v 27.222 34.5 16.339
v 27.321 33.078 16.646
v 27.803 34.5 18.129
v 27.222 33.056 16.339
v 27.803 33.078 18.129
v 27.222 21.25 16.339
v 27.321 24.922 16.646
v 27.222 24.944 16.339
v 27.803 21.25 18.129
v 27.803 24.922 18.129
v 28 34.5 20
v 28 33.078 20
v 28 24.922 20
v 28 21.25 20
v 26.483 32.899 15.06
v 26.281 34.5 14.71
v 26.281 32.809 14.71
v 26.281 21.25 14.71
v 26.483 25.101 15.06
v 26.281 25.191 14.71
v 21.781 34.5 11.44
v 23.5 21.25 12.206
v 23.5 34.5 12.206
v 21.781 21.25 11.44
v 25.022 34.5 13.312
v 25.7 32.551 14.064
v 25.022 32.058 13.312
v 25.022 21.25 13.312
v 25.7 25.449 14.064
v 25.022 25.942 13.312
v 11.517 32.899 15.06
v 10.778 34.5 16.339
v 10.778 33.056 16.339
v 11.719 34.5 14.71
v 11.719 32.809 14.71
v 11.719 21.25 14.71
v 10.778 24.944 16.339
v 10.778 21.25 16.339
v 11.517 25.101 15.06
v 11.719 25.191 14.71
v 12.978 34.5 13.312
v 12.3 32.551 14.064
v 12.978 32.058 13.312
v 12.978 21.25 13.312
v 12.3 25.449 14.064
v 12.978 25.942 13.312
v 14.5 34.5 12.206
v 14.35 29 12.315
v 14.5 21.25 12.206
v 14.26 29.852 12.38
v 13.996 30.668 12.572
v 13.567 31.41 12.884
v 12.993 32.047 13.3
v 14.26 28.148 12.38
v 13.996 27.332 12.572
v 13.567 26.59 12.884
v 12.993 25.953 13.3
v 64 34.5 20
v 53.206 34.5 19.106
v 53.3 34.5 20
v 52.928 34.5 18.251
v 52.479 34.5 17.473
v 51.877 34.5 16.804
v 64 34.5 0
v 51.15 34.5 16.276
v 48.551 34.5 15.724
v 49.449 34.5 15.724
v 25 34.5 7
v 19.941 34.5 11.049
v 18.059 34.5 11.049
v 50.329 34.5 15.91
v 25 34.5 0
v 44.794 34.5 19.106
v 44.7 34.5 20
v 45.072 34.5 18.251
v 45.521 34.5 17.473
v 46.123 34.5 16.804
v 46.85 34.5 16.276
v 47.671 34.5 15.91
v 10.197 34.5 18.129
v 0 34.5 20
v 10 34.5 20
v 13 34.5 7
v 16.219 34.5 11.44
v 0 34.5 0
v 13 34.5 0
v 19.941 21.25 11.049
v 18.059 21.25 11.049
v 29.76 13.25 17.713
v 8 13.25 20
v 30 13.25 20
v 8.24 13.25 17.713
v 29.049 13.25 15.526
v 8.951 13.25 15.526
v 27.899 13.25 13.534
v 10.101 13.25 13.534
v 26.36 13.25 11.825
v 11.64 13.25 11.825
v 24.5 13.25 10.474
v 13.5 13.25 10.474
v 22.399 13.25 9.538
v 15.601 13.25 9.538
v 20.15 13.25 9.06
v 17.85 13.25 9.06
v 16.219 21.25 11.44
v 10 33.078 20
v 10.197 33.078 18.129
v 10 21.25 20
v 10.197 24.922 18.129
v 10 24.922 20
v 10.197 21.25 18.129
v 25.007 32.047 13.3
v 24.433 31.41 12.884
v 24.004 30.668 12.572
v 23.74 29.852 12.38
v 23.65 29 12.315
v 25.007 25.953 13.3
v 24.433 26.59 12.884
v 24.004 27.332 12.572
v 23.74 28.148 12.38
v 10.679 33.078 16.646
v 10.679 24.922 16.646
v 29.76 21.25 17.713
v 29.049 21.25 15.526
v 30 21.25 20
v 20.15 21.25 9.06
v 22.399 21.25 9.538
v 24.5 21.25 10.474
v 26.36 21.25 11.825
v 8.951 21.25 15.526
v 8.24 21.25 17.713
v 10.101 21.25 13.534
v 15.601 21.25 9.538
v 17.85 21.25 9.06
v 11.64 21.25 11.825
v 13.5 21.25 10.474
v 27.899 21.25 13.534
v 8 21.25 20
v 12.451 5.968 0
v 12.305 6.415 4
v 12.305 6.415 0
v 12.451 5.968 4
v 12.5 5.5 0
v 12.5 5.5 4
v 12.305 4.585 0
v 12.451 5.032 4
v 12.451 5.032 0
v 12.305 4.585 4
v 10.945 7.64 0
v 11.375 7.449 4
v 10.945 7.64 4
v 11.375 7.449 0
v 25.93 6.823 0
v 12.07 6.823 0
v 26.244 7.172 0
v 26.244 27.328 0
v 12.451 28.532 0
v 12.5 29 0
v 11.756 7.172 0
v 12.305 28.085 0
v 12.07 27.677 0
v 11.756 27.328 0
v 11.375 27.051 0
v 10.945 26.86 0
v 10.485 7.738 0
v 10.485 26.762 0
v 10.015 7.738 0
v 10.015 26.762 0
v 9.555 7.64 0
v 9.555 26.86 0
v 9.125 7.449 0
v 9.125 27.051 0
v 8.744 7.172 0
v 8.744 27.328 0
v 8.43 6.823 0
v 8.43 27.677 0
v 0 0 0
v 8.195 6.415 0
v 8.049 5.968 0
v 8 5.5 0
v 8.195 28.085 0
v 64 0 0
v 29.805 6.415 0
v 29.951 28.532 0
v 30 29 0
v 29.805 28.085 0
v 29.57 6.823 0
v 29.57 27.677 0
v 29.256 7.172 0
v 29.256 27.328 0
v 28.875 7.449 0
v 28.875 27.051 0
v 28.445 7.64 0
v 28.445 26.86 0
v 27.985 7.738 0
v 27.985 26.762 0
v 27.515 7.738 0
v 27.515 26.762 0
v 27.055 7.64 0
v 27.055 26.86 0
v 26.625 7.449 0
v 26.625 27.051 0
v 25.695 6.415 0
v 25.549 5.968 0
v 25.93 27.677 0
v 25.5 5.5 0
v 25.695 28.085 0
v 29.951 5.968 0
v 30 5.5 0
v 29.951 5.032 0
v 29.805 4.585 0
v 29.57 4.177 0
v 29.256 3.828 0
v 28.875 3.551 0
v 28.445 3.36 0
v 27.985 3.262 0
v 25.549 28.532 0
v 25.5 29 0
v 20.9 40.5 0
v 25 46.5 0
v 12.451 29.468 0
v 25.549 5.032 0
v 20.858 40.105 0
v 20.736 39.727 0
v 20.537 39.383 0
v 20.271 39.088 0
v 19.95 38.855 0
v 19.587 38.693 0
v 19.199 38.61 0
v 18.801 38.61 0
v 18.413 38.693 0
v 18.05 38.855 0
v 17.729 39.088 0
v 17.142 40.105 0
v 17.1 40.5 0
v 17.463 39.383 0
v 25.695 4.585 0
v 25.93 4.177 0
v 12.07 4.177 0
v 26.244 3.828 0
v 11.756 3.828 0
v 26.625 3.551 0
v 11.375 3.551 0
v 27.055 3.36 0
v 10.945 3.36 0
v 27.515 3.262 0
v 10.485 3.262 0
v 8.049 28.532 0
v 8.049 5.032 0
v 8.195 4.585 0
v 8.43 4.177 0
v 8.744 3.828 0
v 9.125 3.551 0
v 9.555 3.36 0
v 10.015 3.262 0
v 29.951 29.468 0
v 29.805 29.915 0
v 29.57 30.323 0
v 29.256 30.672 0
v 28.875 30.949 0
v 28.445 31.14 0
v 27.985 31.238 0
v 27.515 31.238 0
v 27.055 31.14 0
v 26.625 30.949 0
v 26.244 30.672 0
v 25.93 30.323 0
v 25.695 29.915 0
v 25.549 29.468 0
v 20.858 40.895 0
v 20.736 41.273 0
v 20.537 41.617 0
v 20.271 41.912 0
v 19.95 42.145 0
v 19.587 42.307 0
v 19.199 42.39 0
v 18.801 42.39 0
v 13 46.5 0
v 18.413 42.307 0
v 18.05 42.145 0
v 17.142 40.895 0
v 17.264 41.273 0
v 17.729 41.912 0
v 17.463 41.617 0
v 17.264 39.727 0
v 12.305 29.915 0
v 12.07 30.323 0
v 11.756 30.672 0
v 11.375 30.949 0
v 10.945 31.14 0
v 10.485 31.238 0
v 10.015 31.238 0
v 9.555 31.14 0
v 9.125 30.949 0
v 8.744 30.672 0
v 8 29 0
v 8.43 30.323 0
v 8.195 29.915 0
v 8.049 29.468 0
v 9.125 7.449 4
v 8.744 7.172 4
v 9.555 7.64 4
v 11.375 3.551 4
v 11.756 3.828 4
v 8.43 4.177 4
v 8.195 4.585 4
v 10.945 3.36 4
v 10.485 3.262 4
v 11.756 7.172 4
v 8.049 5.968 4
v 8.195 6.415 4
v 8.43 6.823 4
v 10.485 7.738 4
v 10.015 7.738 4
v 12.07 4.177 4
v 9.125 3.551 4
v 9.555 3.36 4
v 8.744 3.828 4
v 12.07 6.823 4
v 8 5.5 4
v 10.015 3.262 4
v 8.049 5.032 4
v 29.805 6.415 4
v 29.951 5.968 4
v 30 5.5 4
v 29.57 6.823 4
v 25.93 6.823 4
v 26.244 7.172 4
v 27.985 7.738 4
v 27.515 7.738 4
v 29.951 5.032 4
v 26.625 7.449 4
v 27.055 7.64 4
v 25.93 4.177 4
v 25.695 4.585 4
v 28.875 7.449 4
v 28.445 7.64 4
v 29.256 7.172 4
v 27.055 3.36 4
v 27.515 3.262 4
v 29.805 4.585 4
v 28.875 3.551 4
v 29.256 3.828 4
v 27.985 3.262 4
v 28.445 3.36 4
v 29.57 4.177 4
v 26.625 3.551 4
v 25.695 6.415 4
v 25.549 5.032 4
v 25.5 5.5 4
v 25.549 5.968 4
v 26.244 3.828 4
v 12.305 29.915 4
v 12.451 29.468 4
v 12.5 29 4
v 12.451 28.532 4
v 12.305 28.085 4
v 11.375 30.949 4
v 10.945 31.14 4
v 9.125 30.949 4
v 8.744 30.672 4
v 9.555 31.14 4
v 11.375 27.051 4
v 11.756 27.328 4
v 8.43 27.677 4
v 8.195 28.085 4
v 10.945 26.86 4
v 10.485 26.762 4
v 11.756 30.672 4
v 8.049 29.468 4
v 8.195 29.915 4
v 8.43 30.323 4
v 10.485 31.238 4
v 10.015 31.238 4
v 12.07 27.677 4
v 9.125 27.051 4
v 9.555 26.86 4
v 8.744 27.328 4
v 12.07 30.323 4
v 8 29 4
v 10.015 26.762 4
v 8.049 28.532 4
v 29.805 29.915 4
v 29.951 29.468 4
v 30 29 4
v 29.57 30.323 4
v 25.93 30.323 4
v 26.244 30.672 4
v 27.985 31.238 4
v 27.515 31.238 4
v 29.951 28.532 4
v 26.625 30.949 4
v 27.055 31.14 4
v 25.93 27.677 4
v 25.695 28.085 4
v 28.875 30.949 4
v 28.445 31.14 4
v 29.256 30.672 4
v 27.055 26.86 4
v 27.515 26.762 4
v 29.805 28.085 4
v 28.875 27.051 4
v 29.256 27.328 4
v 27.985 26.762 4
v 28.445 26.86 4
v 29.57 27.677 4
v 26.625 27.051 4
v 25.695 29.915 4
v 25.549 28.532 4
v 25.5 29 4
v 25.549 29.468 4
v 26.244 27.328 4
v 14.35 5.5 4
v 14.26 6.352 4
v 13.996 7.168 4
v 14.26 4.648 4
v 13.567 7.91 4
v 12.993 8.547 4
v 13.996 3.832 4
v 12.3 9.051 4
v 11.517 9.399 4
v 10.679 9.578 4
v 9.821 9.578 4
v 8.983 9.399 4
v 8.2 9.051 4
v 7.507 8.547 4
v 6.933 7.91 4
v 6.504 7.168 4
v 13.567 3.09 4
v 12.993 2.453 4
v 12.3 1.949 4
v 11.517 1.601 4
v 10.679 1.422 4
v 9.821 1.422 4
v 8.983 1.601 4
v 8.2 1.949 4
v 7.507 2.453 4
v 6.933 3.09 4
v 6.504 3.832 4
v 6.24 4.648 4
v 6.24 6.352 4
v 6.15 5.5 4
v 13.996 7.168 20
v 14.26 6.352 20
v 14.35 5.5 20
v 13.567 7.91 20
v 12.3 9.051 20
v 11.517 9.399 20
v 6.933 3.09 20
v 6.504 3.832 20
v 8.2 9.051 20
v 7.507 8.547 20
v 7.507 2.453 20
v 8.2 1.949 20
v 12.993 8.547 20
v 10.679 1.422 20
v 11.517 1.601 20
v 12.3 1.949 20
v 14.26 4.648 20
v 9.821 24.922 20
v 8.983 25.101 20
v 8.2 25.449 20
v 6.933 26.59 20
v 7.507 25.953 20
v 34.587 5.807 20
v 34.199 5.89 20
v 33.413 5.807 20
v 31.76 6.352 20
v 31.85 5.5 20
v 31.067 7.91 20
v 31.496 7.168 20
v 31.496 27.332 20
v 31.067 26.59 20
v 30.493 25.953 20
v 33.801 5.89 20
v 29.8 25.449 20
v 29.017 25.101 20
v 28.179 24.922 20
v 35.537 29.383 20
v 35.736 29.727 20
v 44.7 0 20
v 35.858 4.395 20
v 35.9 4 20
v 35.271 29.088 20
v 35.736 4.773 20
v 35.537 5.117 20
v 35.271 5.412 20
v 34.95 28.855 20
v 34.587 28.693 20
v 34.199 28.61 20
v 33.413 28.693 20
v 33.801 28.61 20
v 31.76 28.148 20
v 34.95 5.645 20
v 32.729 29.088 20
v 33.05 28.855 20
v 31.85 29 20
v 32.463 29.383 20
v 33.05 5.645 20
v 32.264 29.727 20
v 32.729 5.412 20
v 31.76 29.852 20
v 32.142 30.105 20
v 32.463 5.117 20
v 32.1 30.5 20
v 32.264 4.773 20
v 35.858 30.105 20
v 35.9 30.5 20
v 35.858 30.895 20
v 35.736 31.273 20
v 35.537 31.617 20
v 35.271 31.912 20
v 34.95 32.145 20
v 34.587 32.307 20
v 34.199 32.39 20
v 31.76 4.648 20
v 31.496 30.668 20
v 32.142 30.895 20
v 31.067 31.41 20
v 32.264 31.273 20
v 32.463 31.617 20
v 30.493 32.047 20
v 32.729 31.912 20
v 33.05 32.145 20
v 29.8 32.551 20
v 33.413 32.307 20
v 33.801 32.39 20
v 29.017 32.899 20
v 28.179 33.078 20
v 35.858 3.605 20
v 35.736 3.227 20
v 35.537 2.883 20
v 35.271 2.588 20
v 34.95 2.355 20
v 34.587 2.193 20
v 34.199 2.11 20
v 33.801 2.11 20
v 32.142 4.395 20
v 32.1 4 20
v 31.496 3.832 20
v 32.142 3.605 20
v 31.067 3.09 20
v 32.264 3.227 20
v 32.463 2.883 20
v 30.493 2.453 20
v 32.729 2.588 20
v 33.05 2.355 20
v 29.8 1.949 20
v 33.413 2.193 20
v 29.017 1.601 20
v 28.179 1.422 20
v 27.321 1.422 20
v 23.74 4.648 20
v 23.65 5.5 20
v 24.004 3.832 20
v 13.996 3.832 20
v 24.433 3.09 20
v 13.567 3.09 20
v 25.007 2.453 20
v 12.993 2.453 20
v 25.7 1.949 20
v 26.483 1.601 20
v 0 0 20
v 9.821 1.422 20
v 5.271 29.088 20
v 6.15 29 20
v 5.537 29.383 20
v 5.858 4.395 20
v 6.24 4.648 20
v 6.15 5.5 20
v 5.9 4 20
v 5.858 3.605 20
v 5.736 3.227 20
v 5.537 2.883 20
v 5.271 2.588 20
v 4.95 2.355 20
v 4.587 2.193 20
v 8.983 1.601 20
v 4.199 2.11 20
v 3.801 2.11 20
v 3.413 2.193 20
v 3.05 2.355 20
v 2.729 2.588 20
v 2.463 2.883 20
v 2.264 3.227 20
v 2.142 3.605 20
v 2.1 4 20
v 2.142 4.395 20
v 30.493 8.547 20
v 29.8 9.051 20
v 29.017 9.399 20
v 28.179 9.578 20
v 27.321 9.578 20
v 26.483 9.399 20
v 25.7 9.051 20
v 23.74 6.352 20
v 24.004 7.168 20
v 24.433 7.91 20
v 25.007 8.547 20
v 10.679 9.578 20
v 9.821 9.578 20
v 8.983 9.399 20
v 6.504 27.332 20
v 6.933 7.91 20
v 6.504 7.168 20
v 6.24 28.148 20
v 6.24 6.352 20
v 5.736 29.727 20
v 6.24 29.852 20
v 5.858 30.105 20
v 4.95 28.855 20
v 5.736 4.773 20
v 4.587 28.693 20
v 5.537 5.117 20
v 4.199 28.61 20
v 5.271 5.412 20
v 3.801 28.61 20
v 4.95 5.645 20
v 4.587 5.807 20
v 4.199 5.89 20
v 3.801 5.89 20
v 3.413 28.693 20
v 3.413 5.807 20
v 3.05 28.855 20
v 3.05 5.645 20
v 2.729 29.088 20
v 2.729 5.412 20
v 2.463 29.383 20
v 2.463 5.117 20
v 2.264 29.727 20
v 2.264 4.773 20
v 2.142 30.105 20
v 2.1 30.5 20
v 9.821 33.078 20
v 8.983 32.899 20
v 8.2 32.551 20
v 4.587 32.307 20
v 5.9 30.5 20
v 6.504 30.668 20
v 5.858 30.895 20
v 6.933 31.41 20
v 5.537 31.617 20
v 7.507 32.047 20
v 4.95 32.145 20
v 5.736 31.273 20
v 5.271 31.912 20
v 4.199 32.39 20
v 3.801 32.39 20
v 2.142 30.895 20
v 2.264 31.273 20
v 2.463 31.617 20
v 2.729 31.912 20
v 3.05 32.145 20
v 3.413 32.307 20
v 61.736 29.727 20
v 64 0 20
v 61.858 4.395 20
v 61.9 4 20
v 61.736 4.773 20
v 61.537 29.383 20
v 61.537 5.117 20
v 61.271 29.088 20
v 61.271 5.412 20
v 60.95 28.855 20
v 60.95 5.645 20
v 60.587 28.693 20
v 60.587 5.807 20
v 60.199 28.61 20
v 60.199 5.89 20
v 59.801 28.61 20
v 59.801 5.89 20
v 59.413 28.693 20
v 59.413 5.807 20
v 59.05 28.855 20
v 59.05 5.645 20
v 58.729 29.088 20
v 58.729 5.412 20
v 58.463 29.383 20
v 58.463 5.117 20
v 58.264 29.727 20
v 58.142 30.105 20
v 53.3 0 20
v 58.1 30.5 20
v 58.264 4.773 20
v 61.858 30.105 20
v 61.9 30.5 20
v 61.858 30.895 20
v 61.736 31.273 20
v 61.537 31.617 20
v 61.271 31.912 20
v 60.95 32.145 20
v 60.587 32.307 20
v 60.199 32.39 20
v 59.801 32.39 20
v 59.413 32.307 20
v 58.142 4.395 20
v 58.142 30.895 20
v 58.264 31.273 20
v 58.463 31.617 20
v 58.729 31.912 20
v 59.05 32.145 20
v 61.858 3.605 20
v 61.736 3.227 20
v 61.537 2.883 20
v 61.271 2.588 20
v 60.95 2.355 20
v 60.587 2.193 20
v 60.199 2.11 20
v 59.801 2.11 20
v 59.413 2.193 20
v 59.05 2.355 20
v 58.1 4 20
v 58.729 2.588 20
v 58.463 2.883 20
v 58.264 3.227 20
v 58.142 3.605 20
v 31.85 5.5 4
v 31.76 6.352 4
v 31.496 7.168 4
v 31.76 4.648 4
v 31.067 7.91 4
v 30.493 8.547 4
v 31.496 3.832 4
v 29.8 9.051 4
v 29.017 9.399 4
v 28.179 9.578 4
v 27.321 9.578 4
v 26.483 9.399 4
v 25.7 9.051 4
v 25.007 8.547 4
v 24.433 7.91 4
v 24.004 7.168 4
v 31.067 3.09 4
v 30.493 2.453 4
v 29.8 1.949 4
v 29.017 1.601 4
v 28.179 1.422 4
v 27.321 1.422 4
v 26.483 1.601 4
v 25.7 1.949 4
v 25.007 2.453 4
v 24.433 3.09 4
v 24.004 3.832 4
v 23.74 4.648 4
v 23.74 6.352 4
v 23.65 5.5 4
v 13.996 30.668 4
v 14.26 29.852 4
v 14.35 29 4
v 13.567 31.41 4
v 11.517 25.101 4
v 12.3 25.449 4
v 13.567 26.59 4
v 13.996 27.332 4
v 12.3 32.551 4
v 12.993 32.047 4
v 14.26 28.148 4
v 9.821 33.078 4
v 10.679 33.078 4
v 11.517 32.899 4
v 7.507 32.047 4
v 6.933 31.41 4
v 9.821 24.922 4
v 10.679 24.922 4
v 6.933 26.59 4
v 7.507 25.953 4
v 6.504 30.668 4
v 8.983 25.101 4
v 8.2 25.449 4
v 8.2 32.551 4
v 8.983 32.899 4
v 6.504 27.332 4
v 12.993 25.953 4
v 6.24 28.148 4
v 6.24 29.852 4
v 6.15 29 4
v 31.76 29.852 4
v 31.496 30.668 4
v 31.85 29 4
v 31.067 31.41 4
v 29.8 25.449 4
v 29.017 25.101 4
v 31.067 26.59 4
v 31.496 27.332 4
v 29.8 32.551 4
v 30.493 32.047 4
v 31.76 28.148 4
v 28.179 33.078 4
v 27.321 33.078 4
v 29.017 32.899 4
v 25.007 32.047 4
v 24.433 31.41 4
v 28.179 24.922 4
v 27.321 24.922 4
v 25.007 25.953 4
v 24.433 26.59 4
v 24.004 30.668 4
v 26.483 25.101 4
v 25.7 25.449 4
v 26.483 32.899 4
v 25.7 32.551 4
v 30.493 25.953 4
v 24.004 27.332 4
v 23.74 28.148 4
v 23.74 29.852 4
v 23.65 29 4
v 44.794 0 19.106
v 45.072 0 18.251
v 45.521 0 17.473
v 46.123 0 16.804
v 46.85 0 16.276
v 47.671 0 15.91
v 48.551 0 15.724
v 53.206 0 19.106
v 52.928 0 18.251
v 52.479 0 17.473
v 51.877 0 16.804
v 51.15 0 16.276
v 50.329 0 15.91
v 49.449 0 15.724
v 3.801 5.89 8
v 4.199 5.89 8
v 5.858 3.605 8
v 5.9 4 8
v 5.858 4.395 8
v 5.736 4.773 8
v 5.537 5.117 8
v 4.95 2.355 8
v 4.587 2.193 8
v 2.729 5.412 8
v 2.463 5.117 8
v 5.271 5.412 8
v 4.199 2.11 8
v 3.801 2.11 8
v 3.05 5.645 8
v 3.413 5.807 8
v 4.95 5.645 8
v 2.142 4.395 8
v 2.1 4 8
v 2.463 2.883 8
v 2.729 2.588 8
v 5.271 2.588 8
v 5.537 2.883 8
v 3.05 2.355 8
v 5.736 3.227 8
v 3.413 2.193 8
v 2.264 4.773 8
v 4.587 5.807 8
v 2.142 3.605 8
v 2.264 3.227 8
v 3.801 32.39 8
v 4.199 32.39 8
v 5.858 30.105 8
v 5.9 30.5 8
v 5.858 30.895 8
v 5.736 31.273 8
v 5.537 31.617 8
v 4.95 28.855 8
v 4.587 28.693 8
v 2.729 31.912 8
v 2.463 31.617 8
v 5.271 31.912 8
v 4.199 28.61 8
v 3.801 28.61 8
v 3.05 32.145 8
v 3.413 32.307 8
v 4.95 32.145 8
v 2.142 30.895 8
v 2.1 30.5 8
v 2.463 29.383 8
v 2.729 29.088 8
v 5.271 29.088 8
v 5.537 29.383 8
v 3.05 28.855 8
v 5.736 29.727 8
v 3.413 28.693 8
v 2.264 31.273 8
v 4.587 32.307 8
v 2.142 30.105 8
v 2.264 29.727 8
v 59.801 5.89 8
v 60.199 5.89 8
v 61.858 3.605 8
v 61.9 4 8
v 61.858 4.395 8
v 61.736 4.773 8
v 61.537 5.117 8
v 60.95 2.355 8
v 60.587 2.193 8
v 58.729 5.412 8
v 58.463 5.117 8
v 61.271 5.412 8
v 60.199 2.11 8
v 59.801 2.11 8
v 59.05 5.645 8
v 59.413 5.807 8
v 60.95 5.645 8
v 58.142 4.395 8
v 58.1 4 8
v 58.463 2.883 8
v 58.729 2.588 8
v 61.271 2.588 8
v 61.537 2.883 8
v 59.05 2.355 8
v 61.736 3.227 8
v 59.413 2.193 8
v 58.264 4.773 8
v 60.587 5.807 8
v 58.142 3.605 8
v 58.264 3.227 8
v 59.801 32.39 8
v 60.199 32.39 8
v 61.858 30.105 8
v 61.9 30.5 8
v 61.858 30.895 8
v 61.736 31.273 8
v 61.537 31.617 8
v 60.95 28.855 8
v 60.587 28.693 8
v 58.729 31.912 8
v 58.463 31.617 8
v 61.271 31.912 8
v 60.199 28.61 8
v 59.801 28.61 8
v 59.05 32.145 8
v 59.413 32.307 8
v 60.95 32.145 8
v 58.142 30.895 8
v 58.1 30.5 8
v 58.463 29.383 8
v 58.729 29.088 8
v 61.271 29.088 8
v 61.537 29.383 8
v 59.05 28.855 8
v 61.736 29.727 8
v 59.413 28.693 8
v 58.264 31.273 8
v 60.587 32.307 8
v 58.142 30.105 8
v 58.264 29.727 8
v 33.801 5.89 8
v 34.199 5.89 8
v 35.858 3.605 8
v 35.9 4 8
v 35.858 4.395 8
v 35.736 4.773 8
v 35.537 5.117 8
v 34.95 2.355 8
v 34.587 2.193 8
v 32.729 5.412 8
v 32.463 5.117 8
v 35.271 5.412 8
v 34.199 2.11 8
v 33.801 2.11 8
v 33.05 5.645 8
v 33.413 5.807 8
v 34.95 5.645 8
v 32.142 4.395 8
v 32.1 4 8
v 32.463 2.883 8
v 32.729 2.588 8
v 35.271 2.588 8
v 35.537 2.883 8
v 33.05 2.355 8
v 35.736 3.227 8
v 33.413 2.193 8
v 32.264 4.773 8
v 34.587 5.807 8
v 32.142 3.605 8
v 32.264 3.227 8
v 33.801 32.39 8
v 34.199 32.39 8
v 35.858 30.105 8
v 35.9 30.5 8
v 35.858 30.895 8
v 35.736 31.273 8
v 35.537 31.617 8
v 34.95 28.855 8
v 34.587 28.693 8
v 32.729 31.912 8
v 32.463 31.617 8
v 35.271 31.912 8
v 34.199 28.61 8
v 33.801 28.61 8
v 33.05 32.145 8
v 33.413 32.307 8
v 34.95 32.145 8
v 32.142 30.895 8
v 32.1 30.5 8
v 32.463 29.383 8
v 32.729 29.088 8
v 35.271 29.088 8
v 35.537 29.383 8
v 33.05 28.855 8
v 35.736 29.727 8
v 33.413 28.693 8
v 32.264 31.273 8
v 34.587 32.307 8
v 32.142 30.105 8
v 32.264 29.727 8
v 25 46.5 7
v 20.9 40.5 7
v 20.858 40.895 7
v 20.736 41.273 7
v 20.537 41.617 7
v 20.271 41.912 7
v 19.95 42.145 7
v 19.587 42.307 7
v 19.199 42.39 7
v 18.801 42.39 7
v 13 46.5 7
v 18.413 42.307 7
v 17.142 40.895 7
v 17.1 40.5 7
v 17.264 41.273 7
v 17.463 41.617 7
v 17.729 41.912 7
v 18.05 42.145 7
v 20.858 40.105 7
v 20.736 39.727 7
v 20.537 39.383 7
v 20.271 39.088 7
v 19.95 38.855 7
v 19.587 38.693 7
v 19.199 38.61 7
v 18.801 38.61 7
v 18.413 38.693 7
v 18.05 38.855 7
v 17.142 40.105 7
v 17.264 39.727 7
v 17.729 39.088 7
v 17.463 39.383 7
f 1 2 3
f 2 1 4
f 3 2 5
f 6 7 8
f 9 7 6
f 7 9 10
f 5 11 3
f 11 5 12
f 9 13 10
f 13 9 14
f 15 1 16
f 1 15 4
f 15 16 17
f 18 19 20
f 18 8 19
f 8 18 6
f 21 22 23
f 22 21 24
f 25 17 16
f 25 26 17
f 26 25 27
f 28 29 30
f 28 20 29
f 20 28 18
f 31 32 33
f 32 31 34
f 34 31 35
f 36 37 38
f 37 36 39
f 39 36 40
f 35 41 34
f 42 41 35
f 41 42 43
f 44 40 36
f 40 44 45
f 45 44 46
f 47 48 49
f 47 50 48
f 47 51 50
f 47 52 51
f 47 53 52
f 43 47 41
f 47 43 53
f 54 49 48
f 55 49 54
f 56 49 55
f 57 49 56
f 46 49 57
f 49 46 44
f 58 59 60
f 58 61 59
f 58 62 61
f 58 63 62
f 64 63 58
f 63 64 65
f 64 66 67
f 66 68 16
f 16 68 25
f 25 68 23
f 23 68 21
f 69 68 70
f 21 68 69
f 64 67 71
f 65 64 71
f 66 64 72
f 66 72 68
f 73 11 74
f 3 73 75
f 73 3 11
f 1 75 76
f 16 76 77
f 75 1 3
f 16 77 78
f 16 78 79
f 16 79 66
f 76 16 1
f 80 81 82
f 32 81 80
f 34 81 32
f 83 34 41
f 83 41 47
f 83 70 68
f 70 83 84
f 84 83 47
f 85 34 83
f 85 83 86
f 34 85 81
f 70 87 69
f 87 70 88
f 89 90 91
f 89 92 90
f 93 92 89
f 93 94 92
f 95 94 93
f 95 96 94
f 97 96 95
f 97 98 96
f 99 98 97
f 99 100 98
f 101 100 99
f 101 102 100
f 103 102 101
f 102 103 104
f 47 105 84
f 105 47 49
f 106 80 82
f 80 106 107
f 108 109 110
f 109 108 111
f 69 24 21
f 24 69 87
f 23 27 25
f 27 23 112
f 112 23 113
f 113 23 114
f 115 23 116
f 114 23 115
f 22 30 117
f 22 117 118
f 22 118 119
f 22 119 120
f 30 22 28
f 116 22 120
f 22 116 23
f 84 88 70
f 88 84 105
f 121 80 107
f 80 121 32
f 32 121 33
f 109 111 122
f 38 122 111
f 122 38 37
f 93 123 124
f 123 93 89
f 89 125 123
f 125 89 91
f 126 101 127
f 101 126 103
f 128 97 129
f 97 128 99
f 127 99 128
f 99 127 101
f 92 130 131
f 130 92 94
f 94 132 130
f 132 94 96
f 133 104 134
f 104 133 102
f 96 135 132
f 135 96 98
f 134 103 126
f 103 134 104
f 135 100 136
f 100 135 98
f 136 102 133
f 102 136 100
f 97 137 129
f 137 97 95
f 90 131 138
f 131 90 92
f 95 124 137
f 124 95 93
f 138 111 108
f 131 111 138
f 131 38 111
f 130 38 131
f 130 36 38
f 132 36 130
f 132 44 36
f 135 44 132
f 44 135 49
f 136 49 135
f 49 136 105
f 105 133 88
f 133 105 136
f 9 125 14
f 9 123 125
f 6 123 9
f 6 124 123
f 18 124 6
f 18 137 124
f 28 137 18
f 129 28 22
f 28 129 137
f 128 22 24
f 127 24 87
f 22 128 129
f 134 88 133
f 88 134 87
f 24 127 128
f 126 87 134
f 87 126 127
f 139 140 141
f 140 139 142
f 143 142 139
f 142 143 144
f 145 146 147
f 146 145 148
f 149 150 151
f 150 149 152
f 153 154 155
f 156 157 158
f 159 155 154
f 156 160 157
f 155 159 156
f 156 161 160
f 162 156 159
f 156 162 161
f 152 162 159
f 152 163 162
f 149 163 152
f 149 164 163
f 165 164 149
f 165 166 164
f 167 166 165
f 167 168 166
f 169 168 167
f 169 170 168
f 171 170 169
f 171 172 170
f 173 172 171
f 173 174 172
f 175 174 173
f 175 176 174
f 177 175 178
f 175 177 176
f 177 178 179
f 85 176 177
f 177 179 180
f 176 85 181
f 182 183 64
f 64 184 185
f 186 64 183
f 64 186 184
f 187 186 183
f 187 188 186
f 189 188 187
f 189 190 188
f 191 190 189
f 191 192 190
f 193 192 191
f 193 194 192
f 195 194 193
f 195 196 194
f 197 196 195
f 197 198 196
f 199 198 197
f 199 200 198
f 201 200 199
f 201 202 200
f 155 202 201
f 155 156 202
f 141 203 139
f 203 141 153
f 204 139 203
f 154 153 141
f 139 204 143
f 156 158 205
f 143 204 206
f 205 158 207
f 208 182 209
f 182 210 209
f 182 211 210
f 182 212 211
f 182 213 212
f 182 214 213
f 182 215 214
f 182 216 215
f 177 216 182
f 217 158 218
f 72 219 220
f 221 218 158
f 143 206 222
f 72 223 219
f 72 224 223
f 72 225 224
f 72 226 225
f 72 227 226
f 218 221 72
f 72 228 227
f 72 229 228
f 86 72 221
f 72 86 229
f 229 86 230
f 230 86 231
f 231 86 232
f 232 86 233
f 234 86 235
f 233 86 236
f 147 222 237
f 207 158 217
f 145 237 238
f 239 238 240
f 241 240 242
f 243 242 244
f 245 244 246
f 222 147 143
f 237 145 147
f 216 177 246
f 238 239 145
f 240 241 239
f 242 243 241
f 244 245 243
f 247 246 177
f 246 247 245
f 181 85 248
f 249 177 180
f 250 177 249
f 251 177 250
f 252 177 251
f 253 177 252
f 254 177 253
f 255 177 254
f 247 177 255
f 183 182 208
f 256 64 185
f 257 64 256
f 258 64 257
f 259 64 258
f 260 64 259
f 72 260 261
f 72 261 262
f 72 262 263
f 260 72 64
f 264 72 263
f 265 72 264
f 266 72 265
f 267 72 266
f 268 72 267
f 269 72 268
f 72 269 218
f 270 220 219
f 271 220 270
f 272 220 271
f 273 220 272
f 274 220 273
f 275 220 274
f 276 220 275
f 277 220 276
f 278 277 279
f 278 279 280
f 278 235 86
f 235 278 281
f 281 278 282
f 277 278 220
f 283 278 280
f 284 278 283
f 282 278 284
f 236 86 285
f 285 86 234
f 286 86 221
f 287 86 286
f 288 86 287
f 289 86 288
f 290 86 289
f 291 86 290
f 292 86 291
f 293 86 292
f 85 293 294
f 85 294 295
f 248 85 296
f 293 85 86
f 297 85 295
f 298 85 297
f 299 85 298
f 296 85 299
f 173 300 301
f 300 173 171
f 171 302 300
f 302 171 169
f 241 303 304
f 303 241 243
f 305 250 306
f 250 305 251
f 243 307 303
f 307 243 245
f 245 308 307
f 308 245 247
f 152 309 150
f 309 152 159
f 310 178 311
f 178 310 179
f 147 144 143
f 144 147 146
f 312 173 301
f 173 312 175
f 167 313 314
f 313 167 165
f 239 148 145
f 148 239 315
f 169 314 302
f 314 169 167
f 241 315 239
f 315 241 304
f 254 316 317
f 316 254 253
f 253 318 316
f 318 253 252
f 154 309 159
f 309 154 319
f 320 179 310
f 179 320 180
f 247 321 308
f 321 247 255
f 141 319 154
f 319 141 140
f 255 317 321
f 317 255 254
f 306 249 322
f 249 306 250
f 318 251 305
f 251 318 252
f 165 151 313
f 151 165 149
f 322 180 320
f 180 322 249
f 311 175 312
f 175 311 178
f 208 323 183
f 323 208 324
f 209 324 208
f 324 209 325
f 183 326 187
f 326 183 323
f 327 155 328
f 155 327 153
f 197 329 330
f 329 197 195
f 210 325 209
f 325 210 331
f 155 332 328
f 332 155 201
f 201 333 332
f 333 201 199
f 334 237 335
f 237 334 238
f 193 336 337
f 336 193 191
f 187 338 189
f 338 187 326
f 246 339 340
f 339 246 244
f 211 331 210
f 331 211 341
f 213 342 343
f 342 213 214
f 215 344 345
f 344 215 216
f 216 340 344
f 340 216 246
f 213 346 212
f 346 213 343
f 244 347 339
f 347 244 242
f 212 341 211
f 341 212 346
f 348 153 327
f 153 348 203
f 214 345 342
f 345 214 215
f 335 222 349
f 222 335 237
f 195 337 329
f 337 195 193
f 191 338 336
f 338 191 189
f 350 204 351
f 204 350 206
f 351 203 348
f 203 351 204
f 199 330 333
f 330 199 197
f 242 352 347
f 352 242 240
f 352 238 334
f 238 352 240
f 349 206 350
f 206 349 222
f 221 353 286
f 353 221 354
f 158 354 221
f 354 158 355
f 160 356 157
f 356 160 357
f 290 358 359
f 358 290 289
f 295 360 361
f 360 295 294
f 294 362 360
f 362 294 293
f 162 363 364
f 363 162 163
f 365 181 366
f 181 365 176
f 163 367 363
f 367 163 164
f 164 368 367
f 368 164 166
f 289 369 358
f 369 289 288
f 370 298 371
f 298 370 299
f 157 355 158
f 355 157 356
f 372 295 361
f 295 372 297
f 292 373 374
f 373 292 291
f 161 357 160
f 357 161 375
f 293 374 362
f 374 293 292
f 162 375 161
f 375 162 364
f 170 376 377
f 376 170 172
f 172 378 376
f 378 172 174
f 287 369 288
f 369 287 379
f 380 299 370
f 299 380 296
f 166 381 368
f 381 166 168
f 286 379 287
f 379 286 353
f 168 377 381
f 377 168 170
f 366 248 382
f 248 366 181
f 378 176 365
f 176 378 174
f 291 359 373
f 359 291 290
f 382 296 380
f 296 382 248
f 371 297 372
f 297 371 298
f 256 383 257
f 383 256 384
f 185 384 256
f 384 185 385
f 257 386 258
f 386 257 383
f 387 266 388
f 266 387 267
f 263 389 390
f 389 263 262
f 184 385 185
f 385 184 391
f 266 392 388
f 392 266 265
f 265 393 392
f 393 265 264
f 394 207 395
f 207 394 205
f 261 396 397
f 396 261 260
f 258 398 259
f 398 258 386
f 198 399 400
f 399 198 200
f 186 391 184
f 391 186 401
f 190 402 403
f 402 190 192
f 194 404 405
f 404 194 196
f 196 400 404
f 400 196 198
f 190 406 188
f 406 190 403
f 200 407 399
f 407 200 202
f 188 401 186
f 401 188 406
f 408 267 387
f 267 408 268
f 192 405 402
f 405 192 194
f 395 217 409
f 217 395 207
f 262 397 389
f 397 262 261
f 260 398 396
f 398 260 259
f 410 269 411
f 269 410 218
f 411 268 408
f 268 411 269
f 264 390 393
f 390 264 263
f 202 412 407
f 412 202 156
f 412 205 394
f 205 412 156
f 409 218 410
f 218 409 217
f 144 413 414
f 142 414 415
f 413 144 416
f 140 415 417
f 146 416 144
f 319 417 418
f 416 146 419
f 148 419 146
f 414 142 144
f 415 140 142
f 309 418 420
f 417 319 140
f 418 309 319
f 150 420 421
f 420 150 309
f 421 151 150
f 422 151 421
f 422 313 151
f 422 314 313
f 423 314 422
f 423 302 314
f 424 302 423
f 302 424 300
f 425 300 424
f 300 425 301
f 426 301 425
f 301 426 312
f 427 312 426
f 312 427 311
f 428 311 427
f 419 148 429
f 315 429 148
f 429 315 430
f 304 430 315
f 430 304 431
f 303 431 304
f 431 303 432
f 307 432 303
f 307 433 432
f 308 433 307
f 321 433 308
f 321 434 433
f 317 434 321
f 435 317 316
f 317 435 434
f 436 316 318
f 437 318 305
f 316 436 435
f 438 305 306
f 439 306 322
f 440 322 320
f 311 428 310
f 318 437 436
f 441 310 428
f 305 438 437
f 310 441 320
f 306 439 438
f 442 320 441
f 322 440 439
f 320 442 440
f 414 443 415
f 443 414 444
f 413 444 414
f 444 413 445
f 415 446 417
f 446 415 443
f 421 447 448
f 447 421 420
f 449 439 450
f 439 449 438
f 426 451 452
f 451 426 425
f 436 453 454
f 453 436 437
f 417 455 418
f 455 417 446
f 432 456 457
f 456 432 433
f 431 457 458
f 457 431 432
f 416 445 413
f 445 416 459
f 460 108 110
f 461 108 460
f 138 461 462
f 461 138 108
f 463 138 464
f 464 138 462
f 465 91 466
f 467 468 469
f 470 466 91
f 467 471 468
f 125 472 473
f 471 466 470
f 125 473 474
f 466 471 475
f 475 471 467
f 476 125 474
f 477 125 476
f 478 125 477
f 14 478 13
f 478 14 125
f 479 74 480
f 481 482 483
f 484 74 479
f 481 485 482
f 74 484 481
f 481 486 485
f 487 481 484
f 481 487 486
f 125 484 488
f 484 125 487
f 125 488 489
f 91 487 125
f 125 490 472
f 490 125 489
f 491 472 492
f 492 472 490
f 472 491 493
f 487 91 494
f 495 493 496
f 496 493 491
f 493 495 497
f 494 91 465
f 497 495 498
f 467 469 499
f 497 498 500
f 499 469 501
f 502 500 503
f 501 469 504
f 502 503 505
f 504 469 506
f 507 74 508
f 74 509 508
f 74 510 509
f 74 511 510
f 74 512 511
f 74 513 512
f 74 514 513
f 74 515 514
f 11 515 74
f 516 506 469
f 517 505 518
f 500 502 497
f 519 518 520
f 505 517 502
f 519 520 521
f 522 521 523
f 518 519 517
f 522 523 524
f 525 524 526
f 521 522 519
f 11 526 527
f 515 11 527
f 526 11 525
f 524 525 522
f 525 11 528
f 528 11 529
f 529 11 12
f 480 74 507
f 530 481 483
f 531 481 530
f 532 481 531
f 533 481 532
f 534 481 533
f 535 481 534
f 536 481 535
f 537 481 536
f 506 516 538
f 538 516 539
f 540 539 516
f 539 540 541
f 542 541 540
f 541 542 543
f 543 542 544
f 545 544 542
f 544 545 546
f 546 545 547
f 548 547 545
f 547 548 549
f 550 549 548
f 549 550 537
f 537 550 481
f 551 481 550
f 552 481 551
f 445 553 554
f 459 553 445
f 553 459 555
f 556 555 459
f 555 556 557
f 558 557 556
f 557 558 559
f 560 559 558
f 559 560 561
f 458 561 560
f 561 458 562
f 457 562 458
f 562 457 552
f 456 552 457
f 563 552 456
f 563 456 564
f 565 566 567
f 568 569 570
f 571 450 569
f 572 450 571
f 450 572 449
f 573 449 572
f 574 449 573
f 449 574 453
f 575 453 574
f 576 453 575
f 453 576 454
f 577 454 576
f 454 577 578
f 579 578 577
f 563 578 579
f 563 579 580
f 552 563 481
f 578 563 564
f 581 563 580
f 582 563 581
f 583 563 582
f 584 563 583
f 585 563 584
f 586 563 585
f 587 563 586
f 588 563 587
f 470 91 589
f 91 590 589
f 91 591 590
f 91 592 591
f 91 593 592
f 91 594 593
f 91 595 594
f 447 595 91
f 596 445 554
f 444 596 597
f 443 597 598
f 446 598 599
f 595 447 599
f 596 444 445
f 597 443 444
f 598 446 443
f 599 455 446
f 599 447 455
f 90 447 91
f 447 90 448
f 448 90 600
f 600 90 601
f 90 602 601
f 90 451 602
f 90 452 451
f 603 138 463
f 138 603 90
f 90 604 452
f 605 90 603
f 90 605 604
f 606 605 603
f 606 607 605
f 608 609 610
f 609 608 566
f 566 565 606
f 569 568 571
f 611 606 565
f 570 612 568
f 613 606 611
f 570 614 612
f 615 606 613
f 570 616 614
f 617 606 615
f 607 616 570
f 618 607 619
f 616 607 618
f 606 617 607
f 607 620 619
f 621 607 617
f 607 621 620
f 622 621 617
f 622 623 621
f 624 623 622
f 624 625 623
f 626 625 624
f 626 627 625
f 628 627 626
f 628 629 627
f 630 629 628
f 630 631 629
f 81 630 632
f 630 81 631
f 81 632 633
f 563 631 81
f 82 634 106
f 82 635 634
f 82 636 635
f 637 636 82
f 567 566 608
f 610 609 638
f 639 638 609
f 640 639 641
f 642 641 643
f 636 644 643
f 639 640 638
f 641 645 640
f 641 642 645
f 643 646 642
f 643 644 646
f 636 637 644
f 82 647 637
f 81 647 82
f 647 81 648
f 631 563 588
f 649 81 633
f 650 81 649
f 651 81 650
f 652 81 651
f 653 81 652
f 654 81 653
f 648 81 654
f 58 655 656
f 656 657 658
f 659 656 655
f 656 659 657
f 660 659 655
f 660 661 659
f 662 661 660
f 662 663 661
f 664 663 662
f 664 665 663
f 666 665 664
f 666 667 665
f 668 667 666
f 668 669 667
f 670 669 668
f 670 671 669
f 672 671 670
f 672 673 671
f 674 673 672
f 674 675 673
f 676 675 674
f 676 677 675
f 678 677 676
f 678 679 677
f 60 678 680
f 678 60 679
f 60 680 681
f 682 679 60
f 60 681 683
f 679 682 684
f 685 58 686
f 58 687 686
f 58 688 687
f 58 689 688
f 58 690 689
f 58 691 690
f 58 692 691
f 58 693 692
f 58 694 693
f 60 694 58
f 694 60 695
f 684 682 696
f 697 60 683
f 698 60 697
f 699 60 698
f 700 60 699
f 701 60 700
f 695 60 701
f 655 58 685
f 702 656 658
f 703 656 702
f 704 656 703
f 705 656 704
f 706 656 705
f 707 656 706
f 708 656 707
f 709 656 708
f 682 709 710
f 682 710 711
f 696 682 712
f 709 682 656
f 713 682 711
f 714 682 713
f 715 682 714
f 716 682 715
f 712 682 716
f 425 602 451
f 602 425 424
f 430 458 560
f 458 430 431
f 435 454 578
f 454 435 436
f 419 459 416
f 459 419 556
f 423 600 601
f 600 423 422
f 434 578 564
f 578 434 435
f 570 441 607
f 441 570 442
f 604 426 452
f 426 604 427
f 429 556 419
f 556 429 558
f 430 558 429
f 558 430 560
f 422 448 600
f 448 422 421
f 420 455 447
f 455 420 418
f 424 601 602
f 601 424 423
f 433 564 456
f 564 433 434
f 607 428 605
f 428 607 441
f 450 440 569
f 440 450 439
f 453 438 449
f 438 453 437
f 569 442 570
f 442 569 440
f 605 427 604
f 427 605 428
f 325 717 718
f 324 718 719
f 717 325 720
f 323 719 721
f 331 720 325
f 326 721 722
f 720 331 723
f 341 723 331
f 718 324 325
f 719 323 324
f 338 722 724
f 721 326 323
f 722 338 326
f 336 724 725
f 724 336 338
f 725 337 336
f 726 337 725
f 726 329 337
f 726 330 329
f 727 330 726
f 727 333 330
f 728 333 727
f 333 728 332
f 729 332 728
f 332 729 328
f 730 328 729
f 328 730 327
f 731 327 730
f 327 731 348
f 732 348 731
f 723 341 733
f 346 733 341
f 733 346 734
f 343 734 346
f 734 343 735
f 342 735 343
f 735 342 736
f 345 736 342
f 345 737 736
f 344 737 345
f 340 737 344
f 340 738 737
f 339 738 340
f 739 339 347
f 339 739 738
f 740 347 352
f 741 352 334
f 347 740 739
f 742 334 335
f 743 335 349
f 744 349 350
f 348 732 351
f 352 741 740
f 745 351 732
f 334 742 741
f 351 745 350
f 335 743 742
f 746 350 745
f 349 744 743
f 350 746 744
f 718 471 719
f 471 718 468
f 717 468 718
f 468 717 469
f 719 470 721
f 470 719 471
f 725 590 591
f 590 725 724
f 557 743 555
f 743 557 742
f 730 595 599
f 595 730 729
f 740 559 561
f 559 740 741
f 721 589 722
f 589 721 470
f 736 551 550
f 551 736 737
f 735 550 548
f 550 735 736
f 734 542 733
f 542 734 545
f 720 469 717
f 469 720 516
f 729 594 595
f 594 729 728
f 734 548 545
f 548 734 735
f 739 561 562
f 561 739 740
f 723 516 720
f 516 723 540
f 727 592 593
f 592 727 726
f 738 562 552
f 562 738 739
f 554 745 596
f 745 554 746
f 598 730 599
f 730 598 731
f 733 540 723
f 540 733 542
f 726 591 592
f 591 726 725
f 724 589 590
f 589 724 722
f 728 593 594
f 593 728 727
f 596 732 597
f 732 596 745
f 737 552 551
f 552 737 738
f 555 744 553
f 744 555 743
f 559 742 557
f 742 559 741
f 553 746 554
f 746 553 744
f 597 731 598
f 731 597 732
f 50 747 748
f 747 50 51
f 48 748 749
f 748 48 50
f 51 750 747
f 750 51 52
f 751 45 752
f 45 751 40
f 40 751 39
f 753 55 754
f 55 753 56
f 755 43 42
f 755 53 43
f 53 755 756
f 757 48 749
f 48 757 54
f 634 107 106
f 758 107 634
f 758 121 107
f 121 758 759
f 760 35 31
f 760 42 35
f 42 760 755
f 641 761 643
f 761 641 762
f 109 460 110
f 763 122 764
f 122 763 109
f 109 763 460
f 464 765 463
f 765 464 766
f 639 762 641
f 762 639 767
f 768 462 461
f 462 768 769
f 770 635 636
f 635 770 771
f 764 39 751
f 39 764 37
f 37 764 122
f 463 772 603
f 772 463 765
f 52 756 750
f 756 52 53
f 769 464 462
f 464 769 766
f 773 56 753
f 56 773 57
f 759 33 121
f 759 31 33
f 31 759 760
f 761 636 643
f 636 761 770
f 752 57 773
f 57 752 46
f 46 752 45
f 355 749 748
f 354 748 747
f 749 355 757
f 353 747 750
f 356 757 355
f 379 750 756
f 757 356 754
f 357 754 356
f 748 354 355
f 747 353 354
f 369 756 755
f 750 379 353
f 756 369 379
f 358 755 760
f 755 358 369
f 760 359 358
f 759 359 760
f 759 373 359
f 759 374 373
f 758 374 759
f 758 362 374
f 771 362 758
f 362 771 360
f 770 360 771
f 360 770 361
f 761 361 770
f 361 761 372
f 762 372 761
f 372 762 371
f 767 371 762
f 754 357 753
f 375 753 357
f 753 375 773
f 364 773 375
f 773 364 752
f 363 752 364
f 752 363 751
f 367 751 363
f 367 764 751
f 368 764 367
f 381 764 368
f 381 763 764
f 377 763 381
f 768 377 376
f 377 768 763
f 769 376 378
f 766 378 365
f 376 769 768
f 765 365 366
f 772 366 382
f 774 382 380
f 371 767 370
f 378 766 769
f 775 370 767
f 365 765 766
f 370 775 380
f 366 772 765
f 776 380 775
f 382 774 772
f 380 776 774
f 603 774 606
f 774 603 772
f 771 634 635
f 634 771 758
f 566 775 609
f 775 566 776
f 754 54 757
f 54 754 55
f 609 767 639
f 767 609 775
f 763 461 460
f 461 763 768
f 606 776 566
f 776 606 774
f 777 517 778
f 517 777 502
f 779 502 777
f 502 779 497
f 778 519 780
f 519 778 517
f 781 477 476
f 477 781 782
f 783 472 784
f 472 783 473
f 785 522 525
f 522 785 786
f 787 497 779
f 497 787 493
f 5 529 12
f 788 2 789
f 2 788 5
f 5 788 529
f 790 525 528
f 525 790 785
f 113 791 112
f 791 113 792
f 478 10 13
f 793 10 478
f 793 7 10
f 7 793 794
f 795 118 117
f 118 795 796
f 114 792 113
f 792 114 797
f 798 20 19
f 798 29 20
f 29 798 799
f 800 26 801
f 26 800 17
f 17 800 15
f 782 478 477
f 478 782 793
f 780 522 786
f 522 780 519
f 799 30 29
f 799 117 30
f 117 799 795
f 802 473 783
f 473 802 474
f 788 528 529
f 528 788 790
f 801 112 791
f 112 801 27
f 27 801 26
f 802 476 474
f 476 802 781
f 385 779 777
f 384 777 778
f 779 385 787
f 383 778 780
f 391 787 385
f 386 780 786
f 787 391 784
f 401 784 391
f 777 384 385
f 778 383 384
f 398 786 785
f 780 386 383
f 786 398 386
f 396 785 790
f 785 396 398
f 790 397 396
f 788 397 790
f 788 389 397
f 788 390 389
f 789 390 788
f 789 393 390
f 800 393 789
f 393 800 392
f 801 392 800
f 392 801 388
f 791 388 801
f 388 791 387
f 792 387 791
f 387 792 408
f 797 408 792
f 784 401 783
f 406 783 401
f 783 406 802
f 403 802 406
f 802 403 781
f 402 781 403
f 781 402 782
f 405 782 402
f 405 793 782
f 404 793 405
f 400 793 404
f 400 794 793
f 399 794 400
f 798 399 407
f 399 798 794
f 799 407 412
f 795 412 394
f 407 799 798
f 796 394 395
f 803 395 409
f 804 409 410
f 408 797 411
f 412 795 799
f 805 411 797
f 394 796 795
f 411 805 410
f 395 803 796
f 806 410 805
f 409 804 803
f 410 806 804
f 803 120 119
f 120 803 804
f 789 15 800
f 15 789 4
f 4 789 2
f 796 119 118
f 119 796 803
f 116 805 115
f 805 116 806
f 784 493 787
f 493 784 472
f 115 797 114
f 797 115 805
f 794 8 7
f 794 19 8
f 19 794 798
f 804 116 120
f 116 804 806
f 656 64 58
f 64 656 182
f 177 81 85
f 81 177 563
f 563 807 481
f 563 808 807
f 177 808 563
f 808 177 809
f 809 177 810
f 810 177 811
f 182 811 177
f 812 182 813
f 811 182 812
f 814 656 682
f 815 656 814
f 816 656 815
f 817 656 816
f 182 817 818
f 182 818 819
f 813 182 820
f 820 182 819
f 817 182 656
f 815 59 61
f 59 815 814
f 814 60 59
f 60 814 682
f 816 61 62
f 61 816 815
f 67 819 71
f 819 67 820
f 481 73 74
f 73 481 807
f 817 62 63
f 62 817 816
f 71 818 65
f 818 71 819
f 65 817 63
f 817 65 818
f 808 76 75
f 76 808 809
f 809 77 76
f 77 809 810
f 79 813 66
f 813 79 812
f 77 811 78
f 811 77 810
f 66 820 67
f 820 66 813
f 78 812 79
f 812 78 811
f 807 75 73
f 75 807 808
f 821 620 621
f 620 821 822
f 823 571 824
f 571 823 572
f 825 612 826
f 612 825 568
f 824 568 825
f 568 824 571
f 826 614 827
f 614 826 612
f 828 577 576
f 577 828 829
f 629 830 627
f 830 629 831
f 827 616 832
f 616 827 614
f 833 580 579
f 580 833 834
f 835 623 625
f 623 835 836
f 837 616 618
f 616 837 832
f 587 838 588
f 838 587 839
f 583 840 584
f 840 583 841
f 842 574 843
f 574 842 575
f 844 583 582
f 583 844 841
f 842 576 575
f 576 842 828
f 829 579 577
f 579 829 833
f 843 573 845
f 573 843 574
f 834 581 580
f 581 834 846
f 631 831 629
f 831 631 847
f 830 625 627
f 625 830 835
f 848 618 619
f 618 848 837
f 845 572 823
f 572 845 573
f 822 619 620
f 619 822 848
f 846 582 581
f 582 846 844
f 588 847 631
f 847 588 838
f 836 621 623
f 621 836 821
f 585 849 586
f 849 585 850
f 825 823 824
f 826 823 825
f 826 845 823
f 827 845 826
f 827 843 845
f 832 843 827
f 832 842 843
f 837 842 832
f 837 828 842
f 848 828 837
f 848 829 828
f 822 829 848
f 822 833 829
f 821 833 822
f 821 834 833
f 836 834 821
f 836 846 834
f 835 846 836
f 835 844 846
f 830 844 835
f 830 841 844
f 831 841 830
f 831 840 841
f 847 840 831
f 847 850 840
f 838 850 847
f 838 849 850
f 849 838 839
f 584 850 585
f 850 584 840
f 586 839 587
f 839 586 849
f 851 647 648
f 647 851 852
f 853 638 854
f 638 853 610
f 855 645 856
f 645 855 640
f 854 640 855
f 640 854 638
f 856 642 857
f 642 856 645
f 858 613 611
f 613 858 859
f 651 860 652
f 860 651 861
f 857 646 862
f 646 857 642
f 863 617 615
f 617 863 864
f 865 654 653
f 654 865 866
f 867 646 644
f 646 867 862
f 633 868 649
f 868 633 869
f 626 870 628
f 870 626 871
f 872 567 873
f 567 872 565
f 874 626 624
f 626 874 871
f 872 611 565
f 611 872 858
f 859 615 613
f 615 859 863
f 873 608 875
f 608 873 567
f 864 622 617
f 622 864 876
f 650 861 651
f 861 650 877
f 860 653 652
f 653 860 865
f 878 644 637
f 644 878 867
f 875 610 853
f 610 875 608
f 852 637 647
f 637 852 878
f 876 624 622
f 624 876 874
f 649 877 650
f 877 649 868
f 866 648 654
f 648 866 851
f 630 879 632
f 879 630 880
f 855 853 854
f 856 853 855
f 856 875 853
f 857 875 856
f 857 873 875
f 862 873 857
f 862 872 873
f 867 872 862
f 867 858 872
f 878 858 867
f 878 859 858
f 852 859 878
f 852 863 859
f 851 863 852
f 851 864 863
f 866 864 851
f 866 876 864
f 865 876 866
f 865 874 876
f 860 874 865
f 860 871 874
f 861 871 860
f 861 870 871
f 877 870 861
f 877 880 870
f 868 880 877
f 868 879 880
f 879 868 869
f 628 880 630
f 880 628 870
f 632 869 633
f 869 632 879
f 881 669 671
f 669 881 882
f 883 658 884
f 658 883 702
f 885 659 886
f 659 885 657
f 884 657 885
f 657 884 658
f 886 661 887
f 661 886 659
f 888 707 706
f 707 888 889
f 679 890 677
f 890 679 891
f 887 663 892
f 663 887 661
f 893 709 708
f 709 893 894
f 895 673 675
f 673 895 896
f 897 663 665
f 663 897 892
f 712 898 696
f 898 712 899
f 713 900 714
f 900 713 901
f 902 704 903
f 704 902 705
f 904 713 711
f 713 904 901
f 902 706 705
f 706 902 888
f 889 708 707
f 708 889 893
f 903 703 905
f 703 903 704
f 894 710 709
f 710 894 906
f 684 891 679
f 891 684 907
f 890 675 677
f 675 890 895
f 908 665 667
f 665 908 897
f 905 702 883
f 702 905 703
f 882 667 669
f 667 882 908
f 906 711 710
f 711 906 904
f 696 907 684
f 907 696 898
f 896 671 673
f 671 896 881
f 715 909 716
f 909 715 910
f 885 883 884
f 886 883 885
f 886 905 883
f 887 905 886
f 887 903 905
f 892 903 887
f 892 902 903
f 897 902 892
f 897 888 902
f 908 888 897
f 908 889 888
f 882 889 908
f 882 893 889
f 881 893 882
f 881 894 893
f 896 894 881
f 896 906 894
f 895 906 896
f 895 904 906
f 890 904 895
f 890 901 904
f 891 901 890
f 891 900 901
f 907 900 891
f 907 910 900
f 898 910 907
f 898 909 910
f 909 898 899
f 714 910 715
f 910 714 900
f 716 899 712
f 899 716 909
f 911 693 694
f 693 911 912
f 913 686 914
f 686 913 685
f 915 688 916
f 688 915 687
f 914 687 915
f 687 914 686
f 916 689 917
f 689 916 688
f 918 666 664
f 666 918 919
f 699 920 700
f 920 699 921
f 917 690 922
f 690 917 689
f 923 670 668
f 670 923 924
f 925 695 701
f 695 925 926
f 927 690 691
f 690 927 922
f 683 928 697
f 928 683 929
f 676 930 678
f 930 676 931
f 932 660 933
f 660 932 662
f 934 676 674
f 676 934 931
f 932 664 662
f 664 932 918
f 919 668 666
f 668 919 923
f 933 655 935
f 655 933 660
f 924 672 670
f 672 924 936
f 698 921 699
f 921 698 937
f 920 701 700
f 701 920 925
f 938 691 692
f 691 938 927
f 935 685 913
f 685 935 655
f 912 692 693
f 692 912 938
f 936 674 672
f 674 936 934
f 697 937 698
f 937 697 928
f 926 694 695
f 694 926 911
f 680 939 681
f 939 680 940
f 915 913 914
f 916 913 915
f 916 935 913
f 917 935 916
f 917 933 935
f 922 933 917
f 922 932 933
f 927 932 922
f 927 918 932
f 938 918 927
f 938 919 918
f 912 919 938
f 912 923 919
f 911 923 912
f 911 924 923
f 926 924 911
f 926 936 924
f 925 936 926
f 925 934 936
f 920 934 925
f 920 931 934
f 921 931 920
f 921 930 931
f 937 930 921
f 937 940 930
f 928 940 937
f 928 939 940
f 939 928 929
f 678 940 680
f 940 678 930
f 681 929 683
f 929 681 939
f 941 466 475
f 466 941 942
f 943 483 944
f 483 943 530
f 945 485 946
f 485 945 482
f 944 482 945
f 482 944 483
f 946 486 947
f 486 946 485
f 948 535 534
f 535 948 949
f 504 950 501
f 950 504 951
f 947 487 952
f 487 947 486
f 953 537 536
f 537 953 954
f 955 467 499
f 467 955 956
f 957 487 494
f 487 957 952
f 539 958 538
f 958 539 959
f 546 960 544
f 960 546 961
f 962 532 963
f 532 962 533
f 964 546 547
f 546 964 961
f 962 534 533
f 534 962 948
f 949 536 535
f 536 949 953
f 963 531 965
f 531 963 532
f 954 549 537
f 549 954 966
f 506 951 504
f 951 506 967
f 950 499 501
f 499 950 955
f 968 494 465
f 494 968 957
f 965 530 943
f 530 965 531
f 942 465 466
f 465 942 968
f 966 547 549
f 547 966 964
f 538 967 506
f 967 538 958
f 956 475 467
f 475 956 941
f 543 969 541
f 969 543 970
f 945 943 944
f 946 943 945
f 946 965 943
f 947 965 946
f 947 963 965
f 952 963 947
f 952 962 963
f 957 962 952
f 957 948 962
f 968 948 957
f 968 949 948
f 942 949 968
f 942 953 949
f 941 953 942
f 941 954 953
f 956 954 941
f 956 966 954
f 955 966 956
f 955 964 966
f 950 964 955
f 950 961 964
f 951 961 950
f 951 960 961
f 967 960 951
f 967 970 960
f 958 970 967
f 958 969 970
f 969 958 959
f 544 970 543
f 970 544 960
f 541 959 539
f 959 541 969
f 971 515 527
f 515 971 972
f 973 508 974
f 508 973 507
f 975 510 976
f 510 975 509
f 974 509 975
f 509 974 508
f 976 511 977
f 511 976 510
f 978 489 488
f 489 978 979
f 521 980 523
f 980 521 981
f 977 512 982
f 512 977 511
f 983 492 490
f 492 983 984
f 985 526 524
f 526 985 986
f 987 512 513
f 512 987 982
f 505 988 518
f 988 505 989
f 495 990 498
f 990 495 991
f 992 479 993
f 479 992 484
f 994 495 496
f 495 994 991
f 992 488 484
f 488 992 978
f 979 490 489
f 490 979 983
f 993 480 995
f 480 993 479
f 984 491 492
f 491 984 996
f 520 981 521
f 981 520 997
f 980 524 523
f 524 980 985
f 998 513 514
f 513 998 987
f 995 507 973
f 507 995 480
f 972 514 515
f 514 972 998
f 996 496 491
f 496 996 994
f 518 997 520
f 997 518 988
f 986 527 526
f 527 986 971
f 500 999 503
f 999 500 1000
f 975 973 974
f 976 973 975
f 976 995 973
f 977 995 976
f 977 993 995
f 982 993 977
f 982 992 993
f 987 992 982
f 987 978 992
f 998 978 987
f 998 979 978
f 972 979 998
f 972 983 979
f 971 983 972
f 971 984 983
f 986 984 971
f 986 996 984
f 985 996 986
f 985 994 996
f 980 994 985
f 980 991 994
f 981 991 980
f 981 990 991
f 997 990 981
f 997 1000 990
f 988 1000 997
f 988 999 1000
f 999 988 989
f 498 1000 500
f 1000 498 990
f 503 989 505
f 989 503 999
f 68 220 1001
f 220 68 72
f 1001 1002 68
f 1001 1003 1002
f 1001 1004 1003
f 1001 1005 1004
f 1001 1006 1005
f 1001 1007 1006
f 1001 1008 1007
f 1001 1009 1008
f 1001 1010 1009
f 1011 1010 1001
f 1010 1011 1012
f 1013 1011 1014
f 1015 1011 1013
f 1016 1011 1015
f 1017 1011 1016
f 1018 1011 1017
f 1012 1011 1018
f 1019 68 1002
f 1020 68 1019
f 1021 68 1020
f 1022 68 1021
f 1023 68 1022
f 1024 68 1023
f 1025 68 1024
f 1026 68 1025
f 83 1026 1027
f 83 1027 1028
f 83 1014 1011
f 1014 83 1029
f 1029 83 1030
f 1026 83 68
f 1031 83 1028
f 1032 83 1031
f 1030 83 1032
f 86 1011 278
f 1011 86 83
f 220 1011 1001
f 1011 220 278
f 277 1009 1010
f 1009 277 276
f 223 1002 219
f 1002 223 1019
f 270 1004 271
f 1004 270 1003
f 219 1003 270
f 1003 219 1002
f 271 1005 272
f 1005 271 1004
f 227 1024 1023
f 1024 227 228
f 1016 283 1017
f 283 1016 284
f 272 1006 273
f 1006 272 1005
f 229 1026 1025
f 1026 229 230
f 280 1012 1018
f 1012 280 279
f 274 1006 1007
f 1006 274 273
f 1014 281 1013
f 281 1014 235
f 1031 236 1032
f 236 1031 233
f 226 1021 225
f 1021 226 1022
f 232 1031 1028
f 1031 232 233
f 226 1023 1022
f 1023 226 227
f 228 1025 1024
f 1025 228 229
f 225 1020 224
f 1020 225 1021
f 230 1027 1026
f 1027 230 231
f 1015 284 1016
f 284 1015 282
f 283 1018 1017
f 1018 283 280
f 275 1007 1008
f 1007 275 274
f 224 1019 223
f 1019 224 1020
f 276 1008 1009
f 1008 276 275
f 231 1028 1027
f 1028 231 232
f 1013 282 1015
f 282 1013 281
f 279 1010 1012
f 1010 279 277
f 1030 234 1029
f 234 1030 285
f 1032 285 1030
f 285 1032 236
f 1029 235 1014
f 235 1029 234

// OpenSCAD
// file: shared_variables.scad
// sled
sled_length = 29.5;
sled_width = 34.5;
sled_x_distance = 17.5;
sled_y_distance = 23.5;
sled_screw_hole_diameter = 4.5;
sled_screw_head_diameter = 8.2;
sled_screw_head_th = 3;

// nema 17 stepper motor
motor_width = 45;
motor_mount_height = 40;

// roundbar
axle_holder_width = 30;
axle_set_depth = 12;
roundbar_diameter = 8 + 0.6;
axle_mount_hole_center = (axle_holder_width - roundbar_diameter) / 4;
axle_fastener_height = 11;

// axle_bearing
bearing_diameter = 22;
bearing_thickness = 8;
bearing_mount_width = bearing_diameter + 16;

// general
y_axle_distance = 30;
bottom_th = 8;
wall_th = 8;
sled_clearing_distance = 10 + 2;
motor_backset = 30;
axle_height = 20;
motor_mount_width = motor_width / 2 + y_axle_distance + axle_holder_width / 2;
m3_hole_d = 3.8;
// file: sled_negative.scad
include <shared_variables.scad>

sled_negative();

module sled_negative() {
    translate([-sled_x_distance / 2, -sled_y_distance/2, 0])
        cylinder(d = sled_screw_hole_diameter, h = bottom_th);
    translate([sled_x_distance / 2, -sled_y_distance/2, 0])
        cylinder(d = sled_screw_hole_diameter, h = bottom_th);
    translate([-sled_x_distance / 2, sled_y_distance/2, 0])
        cylinder(d = sled_screw_hole_diameter, h = bottom_th);
    translate([sled_x_distance / 2, sled_y_distance/2, 0])
        cylinder(d = sled_screw_hole_diameter, h = bottom_th);

    translate([-sled_x_distance / 2, -sled_y_distance/2, 4])
        cylinder(d = sled_screw_head_diameter, h = motor_mount_height / 2 - 4);
    translate([sled_x_distance / 2, -sled_y_distance/2, 4])
        cylinder(d = sled_screw_head_diameter, h = motor_mount_height / 2 - 4);
    translate([-sled_x_distance / 2, sled_y_distance/2, 4])
        cylinder(d = sled_screw_head_diameter, h = motor_mount_height / 2 - 4);
    translate([sled_x_distance / 2, sled_y_distance/2, 4])
        cylinder(d = sled_screw_head_diameter, h = motor_mount_height / 2 - 4);
}
// file: nema_17_negative.scad
include <shared_variables.scad>

nema_17_negative();

module nema_17_negative() {
    rotate([270,0,0]) {
        translate([0, 0, 0]) cylinder(d = 25, h = 40);

        translate([-15.5, -15.5, 6.8]) cylinder(d = 6, h = 33, $fn=15);
        translate([15.5, -15.5, 6.8]) cylinder(d = 6, h = 33, $fn=15);
        translate([15.5, 15.5, 6.8]) cylinder(d = 6, h = 33, $fn=15);
        translate([-15.5, 15.5, 6.8]) cylinder(d = 6, h = 33, $fn=15);

        translate([-15.5, -15.5, 0]) cylinder(d = 3.5, h = wall_th, $fn=15);
        translate([15.5, -15.5, 0]) cylinder(d = 3.5, h = wall_th, $fn=15);
        translate([15.5, 15.5, 0]) cylinder(d = 3.5, h = wall_th, $fn=15);
        translate([-15.5, 15.5, 0]) cylinder(d = 3.5, h = wall_th, $fn=15);
    }
}
// main file
use <nema_17_negative.scad>
use <sled_negative.scad>
include <shared_variables.scad>

bottom_y = 40;

$fn = 30;
mount_length = bearing_mount_width / 2 + y_axle_distance + axle_holder_width / 2;

union() {
    difference() {
        // base shape
        cube([mount_length, sled_width, axle_height]);
        // bearing mount
        // bearing mount
        translate([bearing_mount_width / 2, sled_width / 2 - bearing_thickness / 2, axle_height])
        rotate([270, 0, 0]) {           
            cylinder(d = bearing_diameter - 4, h = sled_width / 2 + bearing_thickness / 2);
            cylinder(d = bearing_diameter, h = bearing_thickness);
        }
        // roundbar mount
        translate([bearing_mount_width / 2 + y_axle_distance, 0, axle_height])
            rotate([270, 0, 0])
                cylinder(d = roundbar_diameter, h = sled_width);
        translate([bearing_mount_width / 2, sled_width / 2, 0]) {
            // sled_fasteners
            sled_negative();
        }
        // clam downs
        translate([4, 4, axle_height - 12]) cylinder(d = m3_hole_d, h = 12);
        translate([4, sled_width - 4, axle_height - 12]) cylinder(d = m3_hole_d, h = 12);
        translate([mount_length - 4, 4, axle_height - 12]) cylinder(d = m3_hole_d, h = 12);
        translate([mount_length - 4, sled_width - 4, axle_height - 12]) cylinder(d = m3_hole_d, h = 12);
        translate([bearing_mount_width - 4, 4, axle_height - 12]) cylinder(d = m3_hole_d, h = 12);
        translate([bearing_mount_width - 4, sled_width - 4, axle_height - 12]) cylinder(d = m3_hole_d, h = 12);
    }
    // x traveler mount    
    translate([bearing_mount_width / 2 - 12/2, sled_width, 0]) {
        difference() { 
            cube([12, 12, 7]);
            translate([6, 6, 0]) cylinder(d = m3_hole_d, h = 7);
        }
    }
}
